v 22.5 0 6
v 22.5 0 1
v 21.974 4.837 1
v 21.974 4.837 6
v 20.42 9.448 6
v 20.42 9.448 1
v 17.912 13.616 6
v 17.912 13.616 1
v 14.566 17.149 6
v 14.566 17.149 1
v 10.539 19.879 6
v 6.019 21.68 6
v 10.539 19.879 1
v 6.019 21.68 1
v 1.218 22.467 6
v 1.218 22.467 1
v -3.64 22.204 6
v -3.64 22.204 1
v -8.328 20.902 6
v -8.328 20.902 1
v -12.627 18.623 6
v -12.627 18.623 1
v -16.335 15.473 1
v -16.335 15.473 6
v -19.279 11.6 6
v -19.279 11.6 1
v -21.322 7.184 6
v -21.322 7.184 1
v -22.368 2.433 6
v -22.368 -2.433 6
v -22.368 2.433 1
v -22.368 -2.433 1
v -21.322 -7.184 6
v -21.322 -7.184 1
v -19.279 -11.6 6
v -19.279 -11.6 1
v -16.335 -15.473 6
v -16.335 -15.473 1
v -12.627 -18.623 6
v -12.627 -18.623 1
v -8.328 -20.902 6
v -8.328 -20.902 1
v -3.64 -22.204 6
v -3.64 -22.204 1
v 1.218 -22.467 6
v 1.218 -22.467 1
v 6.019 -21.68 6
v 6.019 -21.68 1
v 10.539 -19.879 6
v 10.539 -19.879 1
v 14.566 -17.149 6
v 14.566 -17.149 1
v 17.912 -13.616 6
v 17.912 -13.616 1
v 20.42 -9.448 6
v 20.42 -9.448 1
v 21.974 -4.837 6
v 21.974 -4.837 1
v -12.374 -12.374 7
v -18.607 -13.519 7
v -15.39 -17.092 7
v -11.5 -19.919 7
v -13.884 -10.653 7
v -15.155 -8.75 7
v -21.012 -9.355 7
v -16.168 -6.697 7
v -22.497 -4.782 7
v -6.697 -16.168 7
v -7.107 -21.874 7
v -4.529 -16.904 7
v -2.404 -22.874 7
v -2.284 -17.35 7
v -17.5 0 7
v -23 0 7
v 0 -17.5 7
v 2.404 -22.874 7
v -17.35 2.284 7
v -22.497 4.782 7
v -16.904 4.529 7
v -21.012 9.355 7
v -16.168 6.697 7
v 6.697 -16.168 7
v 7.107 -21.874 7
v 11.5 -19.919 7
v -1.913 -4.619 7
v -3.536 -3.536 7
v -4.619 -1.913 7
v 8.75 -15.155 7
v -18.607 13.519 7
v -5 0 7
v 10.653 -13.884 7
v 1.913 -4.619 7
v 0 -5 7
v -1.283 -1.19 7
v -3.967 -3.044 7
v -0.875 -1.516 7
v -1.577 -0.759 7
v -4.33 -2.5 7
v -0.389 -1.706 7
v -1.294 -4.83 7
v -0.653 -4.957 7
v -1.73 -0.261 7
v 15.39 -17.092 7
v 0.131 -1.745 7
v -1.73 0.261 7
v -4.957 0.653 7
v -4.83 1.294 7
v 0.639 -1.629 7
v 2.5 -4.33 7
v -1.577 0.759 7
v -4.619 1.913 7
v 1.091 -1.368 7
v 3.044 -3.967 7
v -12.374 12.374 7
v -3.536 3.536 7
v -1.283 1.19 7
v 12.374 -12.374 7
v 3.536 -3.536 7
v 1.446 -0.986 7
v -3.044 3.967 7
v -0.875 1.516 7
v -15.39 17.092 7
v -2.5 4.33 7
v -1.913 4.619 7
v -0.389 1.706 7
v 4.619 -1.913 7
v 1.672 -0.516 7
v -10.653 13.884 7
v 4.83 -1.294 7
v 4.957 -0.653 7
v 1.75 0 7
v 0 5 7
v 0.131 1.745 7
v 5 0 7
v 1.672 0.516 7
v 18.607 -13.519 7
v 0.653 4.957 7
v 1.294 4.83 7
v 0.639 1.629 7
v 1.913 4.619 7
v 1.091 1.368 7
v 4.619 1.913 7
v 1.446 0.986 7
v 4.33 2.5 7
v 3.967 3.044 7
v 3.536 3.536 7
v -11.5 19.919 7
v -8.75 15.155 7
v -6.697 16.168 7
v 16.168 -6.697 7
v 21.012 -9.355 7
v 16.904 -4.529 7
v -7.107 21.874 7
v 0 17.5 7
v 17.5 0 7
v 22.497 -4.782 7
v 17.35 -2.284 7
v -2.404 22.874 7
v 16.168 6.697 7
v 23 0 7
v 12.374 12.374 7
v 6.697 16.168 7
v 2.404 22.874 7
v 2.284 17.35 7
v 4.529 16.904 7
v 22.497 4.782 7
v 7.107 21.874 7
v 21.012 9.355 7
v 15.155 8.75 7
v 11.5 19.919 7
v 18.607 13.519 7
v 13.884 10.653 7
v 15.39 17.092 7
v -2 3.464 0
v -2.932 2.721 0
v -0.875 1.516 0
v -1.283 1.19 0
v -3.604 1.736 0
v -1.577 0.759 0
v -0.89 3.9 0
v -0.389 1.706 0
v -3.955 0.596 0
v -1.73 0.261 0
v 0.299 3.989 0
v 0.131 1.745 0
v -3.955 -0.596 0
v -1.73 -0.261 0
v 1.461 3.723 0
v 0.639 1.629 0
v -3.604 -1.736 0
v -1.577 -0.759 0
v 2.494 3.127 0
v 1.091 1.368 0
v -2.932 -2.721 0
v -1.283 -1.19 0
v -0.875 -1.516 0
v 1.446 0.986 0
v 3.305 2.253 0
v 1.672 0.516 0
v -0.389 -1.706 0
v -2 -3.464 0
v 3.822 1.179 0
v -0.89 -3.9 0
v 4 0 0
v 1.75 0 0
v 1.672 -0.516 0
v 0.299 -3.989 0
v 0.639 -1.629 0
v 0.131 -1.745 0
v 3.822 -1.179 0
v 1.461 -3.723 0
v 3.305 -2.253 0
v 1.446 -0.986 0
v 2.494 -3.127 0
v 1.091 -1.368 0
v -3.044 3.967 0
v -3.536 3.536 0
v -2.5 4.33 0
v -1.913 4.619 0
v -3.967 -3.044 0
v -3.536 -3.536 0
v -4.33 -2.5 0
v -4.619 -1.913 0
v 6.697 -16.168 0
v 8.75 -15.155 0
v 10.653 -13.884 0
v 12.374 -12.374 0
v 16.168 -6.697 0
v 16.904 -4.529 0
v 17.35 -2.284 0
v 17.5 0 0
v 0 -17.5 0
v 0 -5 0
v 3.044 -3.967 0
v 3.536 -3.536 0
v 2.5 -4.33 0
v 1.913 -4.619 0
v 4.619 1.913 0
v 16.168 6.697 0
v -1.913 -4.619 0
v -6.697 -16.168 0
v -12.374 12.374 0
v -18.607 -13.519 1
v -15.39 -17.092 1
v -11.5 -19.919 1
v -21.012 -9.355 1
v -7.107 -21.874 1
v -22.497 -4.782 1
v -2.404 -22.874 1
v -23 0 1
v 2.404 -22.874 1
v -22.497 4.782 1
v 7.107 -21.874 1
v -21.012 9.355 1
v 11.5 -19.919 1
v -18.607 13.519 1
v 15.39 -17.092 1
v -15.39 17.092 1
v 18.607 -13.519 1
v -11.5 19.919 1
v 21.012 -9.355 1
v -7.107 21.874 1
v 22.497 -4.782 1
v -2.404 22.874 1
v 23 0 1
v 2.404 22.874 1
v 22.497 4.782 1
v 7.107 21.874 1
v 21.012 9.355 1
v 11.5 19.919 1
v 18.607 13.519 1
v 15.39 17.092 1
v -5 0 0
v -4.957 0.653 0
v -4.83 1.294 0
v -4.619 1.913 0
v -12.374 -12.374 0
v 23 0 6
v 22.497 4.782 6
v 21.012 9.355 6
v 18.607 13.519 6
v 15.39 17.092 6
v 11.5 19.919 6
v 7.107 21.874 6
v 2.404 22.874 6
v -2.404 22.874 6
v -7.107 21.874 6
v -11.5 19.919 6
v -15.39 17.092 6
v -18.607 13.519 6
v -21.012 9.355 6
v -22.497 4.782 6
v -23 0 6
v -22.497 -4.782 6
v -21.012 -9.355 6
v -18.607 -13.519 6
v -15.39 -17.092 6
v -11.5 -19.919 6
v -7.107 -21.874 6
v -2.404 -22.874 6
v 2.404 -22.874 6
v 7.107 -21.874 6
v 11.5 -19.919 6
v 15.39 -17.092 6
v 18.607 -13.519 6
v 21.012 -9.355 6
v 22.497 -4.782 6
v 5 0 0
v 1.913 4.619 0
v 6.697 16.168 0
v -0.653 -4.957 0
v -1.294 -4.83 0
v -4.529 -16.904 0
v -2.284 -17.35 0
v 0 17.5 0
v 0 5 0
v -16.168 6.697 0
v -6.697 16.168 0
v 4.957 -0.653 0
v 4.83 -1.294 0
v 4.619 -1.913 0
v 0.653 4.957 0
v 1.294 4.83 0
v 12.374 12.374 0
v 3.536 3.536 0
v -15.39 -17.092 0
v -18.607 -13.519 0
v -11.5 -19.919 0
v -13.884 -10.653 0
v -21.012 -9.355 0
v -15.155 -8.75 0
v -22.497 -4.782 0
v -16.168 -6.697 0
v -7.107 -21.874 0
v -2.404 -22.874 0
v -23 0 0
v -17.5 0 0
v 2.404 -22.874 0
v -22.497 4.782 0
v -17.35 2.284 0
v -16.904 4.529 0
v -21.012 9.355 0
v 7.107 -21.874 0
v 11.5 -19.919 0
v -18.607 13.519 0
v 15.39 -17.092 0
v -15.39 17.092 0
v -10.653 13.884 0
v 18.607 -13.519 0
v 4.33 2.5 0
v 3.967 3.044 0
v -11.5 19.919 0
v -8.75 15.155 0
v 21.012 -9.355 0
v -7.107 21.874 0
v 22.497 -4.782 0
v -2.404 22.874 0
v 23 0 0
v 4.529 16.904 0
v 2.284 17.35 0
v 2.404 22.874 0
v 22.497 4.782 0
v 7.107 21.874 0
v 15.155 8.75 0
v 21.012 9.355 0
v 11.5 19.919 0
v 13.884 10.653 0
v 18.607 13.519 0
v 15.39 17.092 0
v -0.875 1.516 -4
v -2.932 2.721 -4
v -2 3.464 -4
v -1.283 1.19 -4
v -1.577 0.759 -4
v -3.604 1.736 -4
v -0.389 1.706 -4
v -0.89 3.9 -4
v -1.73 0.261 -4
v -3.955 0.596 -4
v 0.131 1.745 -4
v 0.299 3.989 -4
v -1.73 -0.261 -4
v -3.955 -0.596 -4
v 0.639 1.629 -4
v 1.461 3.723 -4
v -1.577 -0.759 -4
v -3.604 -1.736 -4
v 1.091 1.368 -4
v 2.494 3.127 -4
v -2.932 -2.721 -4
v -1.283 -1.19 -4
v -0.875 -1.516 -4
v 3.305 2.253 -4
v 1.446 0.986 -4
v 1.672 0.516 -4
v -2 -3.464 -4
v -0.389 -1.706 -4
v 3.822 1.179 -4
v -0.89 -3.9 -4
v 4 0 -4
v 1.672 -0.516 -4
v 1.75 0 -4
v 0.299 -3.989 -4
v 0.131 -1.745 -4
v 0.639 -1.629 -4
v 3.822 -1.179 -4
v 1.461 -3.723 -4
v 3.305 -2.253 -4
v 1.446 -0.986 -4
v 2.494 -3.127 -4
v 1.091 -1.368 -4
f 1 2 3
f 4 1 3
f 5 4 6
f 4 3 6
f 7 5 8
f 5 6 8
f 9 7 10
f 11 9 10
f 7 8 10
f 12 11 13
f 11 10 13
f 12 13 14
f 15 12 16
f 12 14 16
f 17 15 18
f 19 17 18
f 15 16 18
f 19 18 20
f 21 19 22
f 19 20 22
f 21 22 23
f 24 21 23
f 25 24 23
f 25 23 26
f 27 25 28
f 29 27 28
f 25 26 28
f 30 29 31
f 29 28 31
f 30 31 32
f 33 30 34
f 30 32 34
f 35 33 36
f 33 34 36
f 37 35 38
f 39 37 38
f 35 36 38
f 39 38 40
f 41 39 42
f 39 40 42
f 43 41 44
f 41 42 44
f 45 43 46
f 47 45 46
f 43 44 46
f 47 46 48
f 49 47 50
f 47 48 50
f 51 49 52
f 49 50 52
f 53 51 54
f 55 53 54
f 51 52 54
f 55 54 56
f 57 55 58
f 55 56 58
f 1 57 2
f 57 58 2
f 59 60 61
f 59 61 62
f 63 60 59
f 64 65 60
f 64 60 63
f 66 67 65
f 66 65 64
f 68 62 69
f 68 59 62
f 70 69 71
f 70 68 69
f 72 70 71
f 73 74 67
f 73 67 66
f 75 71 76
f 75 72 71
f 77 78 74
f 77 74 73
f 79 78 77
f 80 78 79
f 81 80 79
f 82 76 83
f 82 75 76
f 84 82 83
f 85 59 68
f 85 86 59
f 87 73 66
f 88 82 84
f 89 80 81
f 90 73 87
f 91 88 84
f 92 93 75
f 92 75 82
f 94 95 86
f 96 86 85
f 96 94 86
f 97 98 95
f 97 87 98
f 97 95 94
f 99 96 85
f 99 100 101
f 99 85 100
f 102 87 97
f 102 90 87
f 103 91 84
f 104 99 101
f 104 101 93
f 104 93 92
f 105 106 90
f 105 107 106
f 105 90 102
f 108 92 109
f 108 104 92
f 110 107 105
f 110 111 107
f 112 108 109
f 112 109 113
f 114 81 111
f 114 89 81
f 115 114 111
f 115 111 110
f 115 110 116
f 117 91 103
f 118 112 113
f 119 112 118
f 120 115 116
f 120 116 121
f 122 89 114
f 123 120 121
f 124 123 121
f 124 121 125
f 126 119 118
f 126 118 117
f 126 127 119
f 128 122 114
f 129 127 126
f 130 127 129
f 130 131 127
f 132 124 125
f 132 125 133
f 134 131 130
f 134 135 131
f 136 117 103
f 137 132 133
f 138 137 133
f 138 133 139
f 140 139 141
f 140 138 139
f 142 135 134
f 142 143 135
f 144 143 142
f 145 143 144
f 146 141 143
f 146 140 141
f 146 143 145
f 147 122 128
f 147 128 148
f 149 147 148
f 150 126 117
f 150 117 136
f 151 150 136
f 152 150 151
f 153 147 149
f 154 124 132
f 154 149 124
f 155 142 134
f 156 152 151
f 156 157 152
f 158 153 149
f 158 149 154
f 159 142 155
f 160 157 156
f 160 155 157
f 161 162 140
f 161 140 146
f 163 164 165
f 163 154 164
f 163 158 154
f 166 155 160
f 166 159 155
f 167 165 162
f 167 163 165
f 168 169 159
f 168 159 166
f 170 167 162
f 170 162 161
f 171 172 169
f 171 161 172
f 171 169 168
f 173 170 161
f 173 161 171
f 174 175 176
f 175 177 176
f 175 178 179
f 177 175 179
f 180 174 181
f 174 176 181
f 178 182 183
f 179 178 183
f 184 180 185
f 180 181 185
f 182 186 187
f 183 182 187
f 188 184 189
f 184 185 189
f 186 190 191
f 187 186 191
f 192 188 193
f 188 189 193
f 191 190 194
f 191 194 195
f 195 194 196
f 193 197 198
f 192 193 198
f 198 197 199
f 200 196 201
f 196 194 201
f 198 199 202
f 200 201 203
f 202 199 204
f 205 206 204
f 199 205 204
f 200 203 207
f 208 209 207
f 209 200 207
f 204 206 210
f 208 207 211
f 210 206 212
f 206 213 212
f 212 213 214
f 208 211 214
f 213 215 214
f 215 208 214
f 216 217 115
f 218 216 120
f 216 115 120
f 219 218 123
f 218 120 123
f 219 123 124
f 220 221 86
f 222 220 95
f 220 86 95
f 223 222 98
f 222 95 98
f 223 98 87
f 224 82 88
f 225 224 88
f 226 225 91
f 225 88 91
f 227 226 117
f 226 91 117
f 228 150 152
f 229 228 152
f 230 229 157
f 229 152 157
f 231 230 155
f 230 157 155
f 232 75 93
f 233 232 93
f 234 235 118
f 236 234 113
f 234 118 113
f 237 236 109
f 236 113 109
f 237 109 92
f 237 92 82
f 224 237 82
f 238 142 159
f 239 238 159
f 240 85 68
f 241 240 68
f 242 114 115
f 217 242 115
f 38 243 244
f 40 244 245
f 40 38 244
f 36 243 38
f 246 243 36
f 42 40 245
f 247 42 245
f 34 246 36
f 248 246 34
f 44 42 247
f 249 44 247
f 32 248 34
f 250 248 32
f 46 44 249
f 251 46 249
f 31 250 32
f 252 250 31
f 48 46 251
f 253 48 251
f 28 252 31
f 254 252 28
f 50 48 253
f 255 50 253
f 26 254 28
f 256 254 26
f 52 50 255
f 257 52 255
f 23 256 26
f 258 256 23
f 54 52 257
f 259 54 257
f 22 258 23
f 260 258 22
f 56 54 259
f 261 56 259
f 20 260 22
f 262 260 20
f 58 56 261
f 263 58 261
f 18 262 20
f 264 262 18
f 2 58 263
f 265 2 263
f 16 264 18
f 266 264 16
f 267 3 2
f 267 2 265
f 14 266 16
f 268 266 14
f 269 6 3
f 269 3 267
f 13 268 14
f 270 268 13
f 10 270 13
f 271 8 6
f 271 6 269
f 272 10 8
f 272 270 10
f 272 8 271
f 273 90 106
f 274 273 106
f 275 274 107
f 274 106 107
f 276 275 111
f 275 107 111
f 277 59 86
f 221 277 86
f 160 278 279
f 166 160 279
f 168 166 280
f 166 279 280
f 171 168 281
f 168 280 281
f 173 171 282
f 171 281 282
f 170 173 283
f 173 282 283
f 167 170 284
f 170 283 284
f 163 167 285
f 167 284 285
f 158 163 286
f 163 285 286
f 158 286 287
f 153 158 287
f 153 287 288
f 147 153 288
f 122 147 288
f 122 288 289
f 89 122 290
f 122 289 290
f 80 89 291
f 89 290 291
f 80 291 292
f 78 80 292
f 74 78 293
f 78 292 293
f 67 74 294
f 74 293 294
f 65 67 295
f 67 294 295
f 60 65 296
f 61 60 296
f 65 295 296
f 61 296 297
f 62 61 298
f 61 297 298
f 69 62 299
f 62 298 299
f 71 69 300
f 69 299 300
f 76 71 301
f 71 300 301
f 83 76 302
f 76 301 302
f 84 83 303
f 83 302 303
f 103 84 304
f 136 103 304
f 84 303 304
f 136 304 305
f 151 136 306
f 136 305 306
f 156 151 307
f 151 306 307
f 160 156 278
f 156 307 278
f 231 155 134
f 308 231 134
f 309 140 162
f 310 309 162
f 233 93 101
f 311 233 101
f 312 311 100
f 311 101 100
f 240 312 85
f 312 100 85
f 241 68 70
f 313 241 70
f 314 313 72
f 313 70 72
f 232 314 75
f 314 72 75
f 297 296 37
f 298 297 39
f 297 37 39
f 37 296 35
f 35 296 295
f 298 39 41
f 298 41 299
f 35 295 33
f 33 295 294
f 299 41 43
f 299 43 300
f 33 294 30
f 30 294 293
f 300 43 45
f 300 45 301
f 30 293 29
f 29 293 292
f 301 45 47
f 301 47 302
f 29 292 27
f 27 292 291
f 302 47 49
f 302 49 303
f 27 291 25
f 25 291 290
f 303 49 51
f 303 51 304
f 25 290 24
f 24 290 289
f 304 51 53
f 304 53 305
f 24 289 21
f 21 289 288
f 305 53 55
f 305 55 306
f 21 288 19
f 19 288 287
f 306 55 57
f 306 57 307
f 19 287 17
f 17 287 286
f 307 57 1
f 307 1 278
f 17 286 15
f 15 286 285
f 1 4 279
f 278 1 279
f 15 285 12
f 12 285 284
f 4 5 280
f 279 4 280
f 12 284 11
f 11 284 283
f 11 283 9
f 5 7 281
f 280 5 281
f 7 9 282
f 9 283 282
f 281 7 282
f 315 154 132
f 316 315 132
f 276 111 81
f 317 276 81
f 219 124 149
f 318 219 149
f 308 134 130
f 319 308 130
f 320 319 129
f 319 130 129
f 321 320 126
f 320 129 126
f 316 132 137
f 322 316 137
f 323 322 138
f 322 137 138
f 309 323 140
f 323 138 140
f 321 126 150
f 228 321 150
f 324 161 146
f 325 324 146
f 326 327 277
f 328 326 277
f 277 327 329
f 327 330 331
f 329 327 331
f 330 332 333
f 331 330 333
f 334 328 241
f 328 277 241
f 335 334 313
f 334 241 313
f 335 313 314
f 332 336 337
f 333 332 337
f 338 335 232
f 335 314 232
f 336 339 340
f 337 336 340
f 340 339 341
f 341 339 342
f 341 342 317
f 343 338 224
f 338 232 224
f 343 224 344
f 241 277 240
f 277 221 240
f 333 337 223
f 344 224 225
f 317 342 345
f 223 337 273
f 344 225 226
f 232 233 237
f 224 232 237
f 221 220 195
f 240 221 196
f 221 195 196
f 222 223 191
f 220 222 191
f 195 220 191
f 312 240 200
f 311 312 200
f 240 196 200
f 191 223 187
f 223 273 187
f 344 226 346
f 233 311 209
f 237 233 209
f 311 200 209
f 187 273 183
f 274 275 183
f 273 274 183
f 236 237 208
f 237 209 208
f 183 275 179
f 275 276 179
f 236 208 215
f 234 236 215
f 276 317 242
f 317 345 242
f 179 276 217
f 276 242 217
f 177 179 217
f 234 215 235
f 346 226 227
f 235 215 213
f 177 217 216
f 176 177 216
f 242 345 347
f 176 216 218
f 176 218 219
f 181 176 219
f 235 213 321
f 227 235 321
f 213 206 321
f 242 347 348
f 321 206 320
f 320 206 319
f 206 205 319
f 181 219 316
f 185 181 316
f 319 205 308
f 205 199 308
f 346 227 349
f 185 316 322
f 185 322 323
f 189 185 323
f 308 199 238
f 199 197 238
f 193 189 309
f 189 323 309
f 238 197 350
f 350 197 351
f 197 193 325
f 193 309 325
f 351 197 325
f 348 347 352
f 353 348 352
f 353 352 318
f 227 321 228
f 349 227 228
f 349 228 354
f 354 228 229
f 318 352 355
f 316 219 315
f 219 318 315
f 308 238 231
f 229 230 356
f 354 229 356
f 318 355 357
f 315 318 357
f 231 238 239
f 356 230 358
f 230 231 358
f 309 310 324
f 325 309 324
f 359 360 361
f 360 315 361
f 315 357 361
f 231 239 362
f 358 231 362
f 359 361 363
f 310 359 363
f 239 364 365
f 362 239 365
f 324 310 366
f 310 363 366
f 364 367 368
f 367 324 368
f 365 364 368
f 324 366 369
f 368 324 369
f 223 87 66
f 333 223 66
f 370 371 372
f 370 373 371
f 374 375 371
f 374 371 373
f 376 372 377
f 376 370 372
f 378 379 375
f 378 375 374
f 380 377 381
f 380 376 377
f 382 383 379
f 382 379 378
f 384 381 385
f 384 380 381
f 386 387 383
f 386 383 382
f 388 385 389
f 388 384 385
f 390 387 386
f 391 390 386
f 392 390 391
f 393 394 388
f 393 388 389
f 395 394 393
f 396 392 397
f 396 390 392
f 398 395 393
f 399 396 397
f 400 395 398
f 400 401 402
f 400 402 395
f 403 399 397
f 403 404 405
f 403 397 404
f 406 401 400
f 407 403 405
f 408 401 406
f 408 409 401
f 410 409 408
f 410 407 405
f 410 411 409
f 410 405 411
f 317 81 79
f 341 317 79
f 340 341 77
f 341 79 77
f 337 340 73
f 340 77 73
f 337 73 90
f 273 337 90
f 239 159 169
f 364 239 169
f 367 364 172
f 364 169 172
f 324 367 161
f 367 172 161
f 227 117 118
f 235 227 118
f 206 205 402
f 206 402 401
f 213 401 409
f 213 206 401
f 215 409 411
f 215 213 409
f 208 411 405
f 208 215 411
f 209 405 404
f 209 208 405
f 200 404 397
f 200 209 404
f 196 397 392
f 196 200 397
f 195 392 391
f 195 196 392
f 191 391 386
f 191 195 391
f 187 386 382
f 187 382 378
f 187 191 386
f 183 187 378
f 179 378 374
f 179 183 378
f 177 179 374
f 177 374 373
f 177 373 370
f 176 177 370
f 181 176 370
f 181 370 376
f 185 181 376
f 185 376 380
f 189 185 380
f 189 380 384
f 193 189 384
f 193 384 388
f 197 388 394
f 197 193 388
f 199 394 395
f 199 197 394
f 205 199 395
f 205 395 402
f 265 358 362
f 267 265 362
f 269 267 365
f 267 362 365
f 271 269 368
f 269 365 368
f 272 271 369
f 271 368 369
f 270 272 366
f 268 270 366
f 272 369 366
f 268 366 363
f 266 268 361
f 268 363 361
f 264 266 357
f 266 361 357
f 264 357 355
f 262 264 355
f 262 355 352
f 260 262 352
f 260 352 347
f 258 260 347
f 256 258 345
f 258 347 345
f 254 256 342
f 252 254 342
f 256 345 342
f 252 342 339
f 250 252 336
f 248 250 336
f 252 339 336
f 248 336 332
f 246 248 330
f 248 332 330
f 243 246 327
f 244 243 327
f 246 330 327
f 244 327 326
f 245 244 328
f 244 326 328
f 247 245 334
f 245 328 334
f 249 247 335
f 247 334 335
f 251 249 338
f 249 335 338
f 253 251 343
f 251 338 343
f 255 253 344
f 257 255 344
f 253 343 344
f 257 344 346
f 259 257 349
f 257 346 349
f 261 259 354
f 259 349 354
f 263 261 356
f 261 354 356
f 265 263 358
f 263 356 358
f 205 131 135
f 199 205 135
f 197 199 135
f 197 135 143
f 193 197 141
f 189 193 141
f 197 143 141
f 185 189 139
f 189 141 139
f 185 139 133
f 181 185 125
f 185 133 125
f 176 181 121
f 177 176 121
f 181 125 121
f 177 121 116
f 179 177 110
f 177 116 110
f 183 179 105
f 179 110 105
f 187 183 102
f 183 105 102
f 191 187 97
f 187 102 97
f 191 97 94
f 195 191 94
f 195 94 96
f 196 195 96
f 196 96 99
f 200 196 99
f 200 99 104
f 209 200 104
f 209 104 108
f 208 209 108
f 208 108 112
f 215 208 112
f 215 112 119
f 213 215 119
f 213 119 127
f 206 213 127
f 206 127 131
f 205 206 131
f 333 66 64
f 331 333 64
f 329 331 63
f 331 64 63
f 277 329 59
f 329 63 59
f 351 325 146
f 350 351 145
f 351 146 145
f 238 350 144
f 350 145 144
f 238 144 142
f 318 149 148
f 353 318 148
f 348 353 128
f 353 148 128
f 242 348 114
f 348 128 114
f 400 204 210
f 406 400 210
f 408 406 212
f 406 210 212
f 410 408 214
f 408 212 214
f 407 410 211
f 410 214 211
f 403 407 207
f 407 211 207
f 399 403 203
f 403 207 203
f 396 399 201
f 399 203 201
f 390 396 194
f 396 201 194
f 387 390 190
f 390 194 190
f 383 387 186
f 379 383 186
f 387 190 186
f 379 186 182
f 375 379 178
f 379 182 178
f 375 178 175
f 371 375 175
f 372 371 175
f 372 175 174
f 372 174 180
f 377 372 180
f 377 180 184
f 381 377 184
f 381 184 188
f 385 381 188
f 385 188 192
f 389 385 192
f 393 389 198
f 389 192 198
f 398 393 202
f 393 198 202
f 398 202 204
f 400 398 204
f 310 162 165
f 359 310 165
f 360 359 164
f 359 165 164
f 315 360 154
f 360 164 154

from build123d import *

# Parameters (mm, degrees)
F0_R      = 23
F1_DEPTH  = 1
F2_R      = 22.5
F3_DEPTH  = 5
F4_R      = 23
F4_R_2    = 22.5
F5_DEPTH  = 1
F6_R      = 1.75
F7_DEPTH  = 25
F9_DEPTH  = 10
F10_R     = 4
F10_R_2   = 1.75
F11_DEPTH = 4


with BuildPart() as f1:
    # F0 (on Top) → F1 (new body)
    with BuildSketch(Plane.XY):
        Circle(F0_R)
    extrude(amount=F1_DEPTH)

    # F2 (on face) → F3 (join)
    with BuildSketch(Plane.XY.offset(1)):
        Circle(F2_R)
    extrude(amount=F3_DEPTH)

    # F4 (on face) → F5 (join)
    with BuildSketch(Plane.XY.offset(6)):
        Circle(F4_R)
        Circle(F4_R_2, mode=Mode.SUBTRACT)
        Circle(F4_R_2)
    extrude(amount=F5_DEPTH)

    # F6 (on face) → F7 (cut)
    with BuildSketch(Plane.XY.offset(7)):
        Circle(F6_R)
    extrude(amount=-F7_DEPTH, mode=Mode.SUBTRACT)

    # F8 (on face) → F9 (cut)
    with BuildSketch(Plane.XY.offset(7)):
        with BuildLine():
            ThreePointArc((0, 5), (0.9754516101, 4.903926402), (1.9134171618, 4.6193976626))
            Line((1.9134171618, 4.6193976626), (6.6969600664, 16.1678918189))
            ThreePointArc((6.6969600664, 16.1678918189), (3.4140806353, 17.1637424071), (0, 17.5))
            Line((0, 17.5), (0, 5))
        make_face()
        with BuildLine():
            ThreePointArc((3.5355339059, 3.5355339059), (4.1573480615, 2.7778511651), (4.6193976626, 1.9134171618))
            Line((4.6193976626, 1.9134171618), (16.1678918189, 6.6969600664))
            ThreePointArc((16.1678918189, 6.6969600664), (14.5507182153, 9.7224790778), (12.3743686708, 12.3743686708))
            Line((12.3743686708, 12.3743686708), (3.5355339059, 3.5355339059))
        make_face()
        with BuildLine():
            Line((17.5, 0), (5, 0))
            ThreePointArc((5, 0), (4.903926402, -0.9754516101), (4.6193976626, -1.9134171618))
            Line((4.6193976626, -1.9134171618), (16.1678918189, -6.6969600664))
            ThreePointArc((16.1678918189, -6.6969600664), (17.1637424071, -3.4140806353), (17.5, 0))
        make_face()
        with BuildLine():
            Line((12.3743686708, -12.3743686708), (3.5355339059, -3.5355339059))
            ThreePointArc((3.5355339059, -3.5355339059), (2.7778511651, -4.1573480615), (1.9134171618, -4.6193976626))
            Line((1.9134171618, -4.6193976626), (6.6969600664, -16.1678918189))
            ThreePointArc((6.6969600664, -16.1678918189), (9.7224790778, -14.5507182153), (12.3743686708, -12.3743686708))
        make_face()
        with BuildLine():
            Line((0, -17.5), (0, -5))
            ThreePointArc((0, -5), (-0.9754516101, -4.903926402), (-1.9134171618, -4.6193976626))
            Line((-1.9134171618, -4.6193976626), (-6.6969600664, -16.1678918189))
            ThreePointArc((-6.6969600664, -16.1678918189), (-3.4140806353, -17.1637424071), (0, -17.5))
        make_face()
        with BuildLine():
            ThreePointArc((-3.5355339059, -3.5355339059), (-4.1573480615, -2.7778511651), (-4.6193976626, -1.9134171618))
            Line((-4.6193976626, -1.9134171618), (-16.1678918189, -6.6969600664))
            ThreePointArc((-16.1678918189, -6.6969600664), (-14.5507182153, -9.7224790778), (-12.3743686708, -12.3743686708))
            Line((-12.3743686708, -12.3743686708), (-3.5355339059, -3.5355339059))
        make_face()
        with BuildLine():
            ThreePointArc((-5, 0), (-4.903926402, 0.9754516101), (-4.6193976626, 1.9134171618))
            Line((-4.6193976626, 1.9134171618), (-16.1678918189, 6.6969600664))
            ThreePointArc((-16.1678918189, 6.6969600664), (-17.1637424071, 3.4140806353), (-17.5, 0))
            Line((-17.5, 0), (-5, 0))
        make_face()
        with BuildLine():
            ThreePointArc((-3.5355339059, 3.5355339059), (-2.7778511651, 4.1573480615), (-1.9134171618, 4.6193976626))
            Line((-1.9134171618, 4.6193976626), (-6.6969600664, 16.1678918189))
            ThreePointArc((-6.6969600664, 16.1678918189), (-9.7224790778, 14.5507182153), (-12.3743686708, 12.3743686708))
            Line((-12.3743686708, 12.3743686708), (-3.5355339059, 3.5355339059))
        make_face()
    extrude(amount=-F9_DEPTH, mode=Mode.SUBTRACT)


with BuildPart() as f11:
    # F10 (on face) → F11 (new body)
    with BuildSketch(Plane(origin=(0, 0, 0), x_dir=(1, 0, 0), z_dir=(0, 0, -1))):
        Circle(F10_R)
        Circle(F10_R_2, mode=Mode.SUBTRACT)
    extrude(amount=F11_DEPTH)


solid = Compound([f1.part, f11.part])
